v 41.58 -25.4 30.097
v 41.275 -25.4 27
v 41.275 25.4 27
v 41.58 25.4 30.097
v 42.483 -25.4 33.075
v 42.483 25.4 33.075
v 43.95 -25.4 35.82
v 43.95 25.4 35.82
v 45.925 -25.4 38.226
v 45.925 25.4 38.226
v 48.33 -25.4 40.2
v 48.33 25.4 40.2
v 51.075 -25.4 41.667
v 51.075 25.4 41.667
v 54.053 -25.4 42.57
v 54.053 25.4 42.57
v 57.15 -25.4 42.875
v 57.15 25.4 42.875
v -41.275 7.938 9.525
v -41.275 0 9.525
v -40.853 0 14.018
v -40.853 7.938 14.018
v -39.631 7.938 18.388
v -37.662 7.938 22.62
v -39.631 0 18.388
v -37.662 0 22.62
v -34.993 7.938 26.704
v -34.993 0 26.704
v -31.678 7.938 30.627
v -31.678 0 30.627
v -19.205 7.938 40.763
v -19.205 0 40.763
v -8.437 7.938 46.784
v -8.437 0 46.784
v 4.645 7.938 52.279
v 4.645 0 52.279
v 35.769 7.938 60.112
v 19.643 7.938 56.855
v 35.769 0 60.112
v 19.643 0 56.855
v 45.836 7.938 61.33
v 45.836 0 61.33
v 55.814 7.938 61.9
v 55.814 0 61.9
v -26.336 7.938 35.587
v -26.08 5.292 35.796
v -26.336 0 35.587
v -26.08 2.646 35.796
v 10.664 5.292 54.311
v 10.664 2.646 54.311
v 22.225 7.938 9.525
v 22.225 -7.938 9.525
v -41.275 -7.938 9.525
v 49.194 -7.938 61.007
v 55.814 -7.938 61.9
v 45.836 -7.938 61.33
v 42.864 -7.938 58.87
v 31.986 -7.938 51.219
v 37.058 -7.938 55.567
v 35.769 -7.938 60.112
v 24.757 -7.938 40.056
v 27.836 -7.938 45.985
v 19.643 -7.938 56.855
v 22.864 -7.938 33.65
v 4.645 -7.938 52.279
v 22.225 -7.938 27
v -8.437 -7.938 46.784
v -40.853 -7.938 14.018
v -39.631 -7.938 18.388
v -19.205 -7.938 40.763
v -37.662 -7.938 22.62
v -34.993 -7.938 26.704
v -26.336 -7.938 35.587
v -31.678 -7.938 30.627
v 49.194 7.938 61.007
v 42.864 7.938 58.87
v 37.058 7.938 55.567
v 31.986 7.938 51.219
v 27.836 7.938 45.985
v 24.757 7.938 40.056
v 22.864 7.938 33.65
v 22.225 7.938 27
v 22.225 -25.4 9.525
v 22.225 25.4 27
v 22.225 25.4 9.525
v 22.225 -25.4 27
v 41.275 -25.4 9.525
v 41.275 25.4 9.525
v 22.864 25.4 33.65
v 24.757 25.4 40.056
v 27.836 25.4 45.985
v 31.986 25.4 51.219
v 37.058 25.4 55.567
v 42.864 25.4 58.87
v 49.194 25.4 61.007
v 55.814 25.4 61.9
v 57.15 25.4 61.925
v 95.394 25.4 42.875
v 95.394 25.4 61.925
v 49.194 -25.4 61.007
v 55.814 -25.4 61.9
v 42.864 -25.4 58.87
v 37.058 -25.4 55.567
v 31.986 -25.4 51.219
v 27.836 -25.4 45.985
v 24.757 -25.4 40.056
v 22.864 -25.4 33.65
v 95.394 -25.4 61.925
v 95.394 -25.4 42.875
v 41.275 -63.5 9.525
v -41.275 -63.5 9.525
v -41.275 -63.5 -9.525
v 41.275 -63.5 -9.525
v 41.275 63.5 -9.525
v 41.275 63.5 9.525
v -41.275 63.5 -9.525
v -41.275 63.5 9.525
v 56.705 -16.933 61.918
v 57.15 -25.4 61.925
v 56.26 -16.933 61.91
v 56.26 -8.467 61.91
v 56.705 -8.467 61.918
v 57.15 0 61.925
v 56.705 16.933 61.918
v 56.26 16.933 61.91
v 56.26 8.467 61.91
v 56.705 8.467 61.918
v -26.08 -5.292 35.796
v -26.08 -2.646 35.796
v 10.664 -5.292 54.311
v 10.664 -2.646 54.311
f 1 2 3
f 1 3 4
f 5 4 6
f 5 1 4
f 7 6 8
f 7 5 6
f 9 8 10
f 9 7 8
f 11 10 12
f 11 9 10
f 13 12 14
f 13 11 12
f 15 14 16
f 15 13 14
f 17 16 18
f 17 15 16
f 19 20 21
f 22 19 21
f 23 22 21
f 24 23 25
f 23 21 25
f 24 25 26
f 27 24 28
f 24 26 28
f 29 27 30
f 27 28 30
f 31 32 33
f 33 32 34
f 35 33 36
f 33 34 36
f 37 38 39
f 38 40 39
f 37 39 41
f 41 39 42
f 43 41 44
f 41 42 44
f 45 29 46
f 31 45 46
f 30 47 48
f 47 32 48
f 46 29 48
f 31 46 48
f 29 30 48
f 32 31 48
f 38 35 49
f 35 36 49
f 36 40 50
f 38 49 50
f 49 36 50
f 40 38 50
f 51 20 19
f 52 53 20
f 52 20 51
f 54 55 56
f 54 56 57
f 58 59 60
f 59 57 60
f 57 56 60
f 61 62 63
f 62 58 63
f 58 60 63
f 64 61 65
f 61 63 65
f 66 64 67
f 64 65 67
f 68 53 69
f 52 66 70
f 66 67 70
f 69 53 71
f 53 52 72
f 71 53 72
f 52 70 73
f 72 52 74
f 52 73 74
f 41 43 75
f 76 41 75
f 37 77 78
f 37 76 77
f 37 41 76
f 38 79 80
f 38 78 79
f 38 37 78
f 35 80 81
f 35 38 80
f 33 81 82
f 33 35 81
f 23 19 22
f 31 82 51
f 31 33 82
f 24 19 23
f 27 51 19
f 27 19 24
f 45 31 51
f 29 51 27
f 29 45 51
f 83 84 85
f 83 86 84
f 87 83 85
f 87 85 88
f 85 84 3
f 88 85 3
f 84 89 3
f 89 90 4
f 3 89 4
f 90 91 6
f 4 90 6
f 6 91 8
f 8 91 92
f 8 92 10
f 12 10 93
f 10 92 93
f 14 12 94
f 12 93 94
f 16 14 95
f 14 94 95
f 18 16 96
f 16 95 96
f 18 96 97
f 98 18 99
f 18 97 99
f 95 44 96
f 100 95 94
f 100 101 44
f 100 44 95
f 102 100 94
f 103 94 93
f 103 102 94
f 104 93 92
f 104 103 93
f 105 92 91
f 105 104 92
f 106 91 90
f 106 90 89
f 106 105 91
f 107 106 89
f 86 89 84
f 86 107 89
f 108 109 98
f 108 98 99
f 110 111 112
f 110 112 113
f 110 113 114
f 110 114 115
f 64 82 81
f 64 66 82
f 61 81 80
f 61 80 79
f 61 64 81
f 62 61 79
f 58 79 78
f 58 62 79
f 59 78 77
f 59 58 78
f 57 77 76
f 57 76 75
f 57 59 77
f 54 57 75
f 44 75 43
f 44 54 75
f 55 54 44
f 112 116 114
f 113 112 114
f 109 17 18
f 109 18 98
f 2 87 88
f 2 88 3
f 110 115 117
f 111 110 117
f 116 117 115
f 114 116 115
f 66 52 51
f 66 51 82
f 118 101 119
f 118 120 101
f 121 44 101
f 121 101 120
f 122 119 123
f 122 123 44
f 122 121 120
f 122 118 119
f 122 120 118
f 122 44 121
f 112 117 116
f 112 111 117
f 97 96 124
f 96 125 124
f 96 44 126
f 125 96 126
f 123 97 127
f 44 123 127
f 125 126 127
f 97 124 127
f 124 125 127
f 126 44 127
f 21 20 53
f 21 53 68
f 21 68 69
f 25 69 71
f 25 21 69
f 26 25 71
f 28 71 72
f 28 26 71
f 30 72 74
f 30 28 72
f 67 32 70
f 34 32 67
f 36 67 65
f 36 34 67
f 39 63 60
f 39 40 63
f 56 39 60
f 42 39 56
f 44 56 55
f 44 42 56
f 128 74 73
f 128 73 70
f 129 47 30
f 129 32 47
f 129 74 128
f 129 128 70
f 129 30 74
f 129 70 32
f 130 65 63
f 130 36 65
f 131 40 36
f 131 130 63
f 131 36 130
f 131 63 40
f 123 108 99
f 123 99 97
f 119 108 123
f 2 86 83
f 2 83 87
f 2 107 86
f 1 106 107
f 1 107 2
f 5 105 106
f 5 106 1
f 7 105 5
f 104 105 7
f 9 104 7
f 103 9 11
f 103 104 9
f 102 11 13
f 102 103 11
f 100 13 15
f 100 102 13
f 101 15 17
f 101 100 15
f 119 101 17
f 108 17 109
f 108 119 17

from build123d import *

# Parameters (mm, degrees)
F1_DEPTH = 63.5
F0_W     = 35.068676
F0_H     = 19.05
F2_DEPTH = 25.4
F3_DEPTH = 7.9375


with BuildPart() as f1:
    # F0 (on Front) → F1 (new body, symmetric)
    with BuildSketch(Plane.XZ):
        Polygon((22.225, 9.525), (-41.275, 9.525), (-41.275, -9.525), (41.275, -9.525), (41.275, 9.525), align=None)
    extrude(amount=F1_DEPTH, both=True)


with BuildPart() as f2:
    # F0 (on Front) → F2 (new body, symmetric)
    with BuildSketch(Plane.XZ):
        with BuildLine():
            Line((22.225, 27.0002), (22.225, 9.525))
            Line((22.225, 9.525), (41.275, 9.525))
            Line((41.275, 9.525), (41.275, 27.0002))
            ThreePointArc((41.275, 27.0002), (45.92468, 38.22552), (57.15, 42.8752))
            Line((57.15, 42.8752), (60.325, 42.8752))
            Line((60.325, 42.8752), (60.325, 61.9252))
            Line((60.325, 61.9252), (57.15, 61.9252))
            add(Edge.make_bspline(
                [(55.814037, 61.899639), (56.260076, 61.910244), (56.705417, 61.918769), (57.15, 61.9252)],
                knots=[110.409451, 110.409451, 110.409451, 110.409451, 111.504536, 111.504536, 111.504536, 111.504536], degree=3))
            ThreePointArc((55.814037, 61.899639), (31.986394, 51.218965), (22.225, 27.0002))
        make_face()
        with Locations((77.859338, 52.4002)):
            Rectangle(F0_W, F0_H)
    extrude(amount=F2_DEPTH, both=True)


with BuildPart() as f3:
    # F0 (on Front) → F3 (new body, symmetric)
    with BuildSketch(Plane.XZ):
        with BuildLine():
            add(Edge.make_bspline(
                [(-41.275, 9.525), (-41.235581, 38.616974), (10.843135, 60.830404), (55.814037, 61.899639)],
                knots=[0, 0, 0, 0, 110.409451, 110.409451, 110.409451, 110.409451], degree=3))
            Line((-41.275, 9.525), (22.225, 9.525))
            Line((22.225, 9.525), (22.225, 27.0002))
            ThreePointArc((22.225, 27.0002), (31.986394, 51.218965), (55.814037, 61.899639))
        make_face()
    extrude(amount=F3_DEPTH, both=True)


solid = Compound([f1.part, f2.part, f3.part])
